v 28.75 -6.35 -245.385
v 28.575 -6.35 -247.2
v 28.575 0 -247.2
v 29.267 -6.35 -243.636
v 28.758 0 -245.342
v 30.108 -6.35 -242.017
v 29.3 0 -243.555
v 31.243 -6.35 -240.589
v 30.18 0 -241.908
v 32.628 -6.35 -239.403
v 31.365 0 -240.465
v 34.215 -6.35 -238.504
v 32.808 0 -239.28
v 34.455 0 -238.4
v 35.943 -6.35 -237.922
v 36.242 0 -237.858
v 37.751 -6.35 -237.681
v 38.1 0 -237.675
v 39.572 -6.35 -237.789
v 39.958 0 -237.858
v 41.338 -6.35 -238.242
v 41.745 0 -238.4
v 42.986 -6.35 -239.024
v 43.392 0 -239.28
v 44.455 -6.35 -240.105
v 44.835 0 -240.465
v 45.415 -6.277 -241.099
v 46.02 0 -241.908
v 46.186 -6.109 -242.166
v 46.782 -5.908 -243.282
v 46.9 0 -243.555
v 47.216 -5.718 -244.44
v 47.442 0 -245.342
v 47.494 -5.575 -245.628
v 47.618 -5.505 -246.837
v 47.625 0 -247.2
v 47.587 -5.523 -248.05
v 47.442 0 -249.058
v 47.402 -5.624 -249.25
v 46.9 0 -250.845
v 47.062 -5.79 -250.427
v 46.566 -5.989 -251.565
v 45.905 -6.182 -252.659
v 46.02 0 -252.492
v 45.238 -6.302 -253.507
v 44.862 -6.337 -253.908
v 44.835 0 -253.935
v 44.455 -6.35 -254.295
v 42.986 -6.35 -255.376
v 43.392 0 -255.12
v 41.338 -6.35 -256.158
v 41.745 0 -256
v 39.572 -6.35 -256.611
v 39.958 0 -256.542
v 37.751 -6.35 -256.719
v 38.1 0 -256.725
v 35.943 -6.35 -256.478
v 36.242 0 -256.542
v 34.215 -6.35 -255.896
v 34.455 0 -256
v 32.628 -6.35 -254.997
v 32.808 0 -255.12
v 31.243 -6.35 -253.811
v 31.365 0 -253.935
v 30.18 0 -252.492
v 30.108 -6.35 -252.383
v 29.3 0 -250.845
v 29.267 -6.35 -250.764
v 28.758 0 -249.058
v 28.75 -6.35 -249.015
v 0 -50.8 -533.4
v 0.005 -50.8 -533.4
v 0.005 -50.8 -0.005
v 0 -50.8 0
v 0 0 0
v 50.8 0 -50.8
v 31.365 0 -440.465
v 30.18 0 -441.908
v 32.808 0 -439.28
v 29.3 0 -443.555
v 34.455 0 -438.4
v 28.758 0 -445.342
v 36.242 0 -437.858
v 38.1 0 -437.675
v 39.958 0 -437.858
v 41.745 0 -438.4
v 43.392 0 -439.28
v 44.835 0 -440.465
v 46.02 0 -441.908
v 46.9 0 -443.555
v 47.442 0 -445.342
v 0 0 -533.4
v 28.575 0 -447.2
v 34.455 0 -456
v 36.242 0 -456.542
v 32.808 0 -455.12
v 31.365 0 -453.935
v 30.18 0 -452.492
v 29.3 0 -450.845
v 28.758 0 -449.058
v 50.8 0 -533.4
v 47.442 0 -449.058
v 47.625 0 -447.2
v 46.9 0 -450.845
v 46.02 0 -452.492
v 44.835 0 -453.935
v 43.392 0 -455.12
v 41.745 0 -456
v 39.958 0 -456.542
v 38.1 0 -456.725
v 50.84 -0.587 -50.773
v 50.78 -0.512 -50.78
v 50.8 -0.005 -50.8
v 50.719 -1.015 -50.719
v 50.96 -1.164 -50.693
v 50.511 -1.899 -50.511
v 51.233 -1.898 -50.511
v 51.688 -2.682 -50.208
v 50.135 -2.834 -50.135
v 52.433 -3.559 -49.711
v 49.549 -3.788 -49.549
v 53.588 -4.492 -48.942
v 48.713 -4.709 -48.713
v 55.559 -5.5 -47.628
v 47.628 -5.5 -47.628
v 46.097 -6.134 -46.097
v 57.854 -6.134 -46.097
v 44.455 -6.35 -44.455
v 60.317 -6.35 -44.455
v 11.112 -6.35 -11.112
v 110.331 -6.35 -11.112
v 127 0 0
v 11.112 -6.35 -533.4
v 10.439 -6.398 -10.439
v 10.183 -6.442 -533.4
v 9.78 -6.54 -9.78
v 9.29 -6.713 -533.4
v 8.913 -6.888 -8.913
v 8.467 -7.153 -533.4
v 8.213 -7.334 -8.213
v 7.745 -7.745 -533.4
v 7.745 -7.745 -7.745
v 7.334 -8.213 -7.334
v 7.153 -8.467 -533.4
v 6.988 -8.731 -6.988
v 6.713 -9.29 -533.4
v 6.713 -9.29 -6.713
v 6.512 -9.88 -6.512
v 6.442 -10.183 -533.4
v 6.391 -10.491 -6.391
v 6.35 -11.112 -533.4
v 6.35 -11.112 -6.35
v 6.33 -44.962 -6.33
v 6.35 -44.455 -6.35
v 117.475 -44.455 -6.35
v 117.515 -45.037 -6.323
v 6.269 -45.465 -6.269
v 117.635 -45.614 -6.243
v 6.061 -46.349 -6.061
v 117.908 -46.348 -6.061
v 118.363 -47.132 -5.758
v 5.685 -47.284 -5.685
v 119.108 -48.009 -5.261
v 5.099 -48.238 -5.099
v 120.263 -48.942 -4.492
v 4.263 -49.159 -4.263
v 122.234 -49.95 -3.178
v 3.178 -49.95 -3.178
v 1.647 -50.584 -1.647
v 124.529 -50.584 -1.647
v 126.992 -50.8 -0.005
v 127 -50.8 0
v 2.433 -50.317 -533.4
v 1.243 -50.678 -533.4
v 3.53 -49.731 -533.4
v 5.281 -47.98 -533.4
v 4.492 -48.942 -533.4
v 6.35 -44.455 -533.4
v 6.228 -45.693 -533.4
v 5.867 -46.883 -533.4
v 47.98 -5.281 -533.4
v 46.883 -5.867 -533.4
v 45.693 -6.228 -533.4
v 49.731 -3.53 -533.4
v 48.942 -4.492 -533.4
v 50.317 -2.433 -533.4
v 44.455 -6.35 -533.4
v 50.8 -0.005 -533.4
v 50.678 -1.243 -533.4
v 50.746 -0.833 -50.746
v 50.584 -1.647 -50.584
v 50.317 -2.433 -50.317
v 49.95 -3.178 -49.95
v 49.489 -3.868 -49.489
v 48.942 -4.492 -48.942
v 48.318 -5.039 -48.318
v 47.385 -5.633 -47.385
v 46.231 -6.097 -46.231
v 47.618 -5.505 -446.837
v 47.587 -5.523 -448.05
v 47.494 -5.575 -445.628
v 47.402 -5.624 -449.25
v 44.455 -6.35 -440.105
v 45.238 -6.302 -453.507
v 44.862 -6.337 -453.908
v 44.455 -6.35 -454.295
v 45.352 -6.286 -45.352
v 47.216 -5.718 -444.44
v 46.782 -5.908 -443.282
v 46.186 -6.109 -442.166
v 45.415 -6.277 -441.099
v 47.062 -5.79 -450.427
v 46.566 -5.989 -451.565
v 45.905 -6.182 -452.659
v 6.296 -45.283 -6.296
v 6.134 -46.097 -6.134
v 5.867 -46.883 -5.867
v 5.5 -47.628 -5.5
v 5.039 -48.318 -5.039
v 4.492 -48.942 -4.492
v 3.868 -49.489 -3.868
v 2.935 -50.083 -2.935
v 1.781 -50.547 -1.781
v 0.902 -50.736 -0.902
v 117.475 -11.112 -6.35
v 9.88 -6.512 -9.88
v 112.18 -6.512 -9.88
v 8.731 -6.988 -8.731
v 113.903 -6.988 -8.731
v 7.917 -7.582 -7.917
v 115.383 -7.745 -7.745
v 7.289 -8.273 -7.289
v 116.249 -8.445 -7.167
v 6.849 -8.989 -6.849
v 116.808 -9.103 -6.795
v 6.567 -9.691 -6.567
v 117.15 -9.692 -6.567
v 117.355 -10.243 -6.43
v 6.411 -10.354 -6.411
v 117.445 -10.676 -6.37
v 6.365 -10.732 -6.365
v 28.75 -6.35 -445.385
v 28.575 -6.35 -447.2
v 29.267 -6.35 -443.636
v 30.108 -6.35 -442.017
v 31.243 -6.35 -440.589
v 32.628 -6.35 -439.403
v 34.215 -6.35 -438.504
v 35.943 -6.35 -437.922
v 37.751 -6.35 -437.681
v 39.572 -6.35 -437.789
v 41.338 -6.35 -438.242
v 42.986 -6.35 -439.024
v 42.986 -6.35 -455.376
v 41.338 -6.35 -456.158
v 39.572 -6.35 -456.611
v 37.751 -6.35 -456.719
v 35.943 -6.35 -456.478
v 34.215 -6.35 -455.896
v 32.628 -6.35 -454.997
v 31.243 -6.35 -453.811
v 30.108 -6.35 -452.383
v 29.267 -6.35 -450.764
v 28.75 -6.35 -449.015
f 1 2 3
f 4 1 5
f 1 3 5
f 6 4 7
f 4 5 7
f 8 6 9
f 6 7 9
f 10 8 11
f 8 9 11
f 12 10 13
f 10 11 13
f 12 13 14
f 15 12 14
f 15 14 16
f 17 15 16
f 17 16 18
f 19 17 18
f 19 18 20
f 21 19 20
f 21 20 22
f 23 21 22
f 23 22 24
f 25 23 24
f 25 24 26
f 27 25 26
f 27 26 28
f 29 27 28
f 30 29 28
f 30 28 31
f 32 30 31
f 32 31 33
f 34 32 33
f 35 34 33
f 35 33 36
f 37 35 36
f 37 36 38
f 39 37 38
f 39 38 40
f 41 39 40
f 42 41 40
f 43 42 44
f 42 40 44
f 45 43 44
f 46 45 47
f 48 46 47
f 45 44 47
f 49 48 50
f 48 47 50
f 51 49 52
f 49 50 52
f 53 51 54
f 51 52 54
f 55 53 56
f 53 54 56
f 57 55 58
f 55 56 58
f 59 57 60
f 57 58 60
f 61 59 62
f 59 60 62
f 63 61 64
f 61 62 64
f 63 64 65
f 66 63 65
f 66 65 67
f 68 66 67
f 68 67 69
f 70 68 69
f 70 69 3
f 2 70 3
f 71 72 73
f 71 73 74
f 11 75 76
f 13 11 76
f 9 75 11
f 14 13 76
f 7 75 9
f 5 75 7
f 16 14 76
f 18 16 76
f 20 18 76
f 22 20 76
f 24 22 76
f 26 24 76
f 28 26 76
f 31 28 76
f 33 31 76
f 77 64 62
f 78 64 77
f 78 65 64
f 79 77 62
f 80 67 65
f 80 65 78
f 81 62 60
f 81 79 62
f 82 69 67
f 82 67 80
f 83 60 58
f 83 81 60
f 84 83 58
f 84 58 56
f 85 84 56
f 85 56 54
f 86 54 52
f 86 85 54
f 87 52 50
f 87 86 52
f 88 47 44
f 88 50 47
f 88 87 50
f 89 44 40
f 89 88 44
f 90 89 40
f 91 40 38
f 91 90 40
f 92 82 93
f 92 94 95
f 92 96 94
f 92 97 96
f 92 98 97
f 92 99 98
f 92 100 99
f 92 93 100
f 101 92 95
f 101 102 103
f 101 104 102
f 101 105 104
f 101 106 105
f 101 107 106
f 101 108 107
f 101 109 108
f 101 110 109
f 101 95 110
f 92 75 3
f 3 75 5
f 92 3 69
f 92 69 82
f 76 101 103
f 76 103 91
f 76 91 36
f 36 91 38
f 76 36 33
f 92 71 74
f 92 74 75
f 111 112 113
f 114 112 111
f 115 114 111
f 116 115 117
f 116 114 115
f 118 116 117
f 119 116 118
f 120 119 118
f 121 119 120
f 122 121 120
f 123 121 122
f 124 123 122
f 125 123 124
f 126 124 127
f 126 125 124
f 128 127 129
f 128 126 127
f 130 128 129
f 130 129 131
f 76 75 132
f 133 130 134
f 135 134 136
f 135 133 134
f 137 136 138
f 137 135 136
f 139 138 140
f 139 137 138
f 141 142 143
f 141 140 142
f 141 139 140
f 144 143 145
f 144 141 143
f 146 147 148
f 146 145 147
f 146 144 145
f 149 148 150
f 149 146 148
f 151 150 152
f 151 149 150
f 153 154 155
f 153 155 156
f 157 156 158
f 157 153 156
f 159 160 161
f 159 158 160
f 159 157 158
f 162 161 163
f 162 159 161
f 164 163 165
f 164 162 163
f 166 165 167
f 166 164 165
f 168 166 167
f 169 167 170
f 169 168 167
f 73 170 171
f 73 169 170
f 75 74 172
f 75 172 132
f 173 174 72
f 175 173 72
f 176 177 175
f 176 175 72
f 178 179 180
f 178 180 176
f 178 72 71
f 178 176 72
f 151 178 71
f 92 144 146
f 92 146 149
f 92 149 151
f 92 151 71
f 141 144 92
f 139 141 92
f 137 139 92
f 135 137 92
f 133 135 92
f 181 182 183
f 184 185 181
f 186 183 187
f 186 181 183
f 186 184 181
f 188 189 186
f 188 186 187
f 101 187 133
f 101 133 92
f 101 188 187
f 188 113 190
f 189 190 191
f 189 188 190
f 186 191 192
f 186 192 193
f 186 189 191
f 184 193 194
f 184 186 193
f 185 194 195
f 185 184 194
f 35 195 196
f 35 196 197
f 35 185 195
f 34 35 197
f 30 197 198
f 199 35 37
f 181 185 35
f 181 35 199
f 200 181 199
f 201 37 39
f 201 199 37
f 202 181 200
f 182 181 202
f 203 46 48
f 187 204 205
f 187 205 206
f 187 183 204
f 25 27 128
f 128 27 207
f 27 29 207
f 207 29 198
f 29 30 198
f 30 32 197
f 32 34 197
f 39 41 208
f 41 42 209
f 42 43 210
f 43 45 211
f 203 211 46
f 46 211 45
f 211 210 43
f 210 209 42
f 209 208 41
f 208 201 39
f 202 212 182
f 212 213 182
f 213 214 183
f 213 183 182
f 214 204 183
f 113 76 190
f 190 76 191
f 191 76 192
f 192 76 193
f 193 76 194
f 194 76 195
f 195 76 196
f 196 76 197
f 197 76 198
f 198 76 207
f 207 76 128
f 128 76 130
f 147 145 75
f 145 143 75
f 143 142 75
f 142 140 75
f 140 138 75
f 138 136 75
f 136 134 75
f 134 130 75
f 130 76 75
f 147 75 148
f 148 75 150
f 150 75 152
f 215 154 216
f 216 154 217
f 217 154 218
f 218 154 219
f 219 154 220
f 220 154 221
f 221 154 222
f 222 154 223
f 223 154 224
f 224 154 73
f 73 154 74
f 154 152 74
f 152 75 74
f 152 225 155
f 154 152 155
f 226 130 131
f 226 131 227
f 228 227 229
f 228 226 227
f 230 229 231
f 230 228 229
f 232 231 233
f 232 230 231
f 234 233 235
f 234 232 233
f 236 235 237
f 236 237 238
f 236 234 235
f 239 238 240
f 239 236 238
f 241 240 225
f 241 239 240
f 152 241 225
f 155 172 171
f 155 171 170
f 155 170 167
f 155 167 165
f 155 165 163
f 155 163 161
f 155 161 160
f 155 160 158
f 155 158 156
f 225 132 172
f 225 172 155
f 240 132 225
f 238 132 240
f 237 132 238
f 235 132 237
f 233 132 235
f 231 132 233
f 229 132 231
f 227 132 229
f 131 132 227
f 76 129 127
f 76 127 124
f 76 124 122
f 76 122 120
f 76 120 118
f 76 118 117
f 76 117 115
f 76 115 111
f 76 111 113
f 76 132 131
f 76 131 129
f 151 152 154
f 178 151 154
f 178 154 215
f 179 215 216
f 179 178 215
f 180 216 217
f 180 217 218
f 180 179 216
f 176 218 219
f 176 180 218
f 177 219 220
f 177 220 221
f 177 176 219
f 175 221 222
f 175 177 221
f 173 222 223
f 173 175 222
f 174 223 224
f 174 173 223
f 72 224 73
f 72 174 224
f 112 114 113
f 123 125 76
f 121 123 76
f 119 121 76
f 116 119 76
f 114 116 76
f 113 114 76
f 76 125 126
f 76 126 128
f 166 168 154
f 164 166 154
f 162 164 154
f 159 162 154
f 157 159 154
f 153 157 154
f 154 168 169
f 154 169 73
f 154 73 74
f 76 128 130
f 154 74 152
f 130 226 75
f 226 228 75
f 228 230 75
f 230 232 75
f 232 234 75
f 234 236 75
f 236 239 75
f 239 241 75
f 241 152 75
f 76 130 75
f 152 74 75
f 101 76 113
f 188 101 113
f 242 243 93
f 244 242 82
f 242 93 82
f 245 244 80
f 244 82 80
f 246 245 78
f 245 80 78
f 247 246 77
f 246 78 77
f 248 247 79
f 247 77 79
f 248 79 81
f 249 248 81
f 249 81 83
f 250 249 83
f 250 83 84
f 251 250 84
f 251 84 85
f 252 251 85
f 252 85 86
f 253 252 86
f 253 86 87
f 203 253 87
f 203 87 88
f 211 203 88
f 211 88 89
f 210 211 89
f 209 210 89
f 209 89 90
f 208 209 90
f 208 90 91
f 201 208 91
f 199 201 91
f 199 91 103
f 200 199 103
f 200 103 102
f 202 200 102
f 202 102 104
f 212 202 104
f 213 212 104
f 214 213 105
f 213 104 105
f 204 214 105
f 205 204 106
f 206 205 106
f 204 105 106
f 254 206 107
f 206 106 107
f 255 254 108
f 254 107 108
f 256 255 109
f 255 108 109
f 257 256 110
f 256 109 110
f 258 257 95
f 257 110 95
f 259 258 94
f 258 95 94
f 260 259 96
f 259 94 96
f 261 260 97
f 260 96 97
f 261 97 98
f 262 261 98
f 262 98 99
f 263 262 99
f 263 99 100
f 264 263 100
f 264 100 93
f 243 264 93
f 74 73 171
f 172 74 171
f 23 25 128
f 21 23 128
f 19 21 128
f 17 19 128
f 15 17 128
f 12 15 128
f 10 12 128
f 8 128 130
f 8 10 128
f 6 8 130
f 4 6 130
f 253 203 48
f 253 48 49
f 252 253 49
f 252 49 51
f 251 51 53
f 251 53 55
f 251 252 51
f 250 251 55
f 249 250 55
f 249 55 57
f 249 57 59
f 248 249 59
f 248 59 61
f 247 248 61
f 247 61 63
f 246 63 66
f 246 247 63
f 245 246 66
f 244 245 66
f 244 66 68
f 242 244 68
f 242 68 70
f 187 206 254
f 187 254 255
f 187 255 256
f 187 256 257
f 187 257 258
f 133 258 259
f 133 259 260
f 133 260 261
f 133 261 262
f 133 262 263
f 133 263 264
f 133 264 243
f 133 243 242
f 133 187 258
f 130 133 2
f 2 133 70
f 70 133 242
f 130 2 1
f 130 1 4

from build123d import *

# Parameters (mm, degrees)
HIERRO_ANGULAR_2_X_2_X_0_125_1_DEPTH        = 606.242048969
HIERRO_ANGULAR_2_X_2_X_0_125_1_2_DEPTH      = 127
HIERRO_ANGULAR_2_X_2_X_0_125_1_2_DEPTH_BACK = 72.842048969
CROQUIS2_R                                  = 9.525
CORTAR_EXTRUIR1_DEPTH                       = 551.658878072
CORTAR_EXTRUIR2_DEPTH                       = 176.53


with BuildPart() as part:
    # Sketch1 on segment 1 (carried to segment 1) → Hierro angular 2 X 2 X 0.125(1) (new body)
    with BuildSketch(Plane(origin=(0, 0, -533.4), x_dir=(0, -1, 0), z_dir=(0, 0, 1))):
        with BuildLine():
            Line((0, 0), (0, 50.8))
            Line((0, 50.8), (0.00508, 50.8))
            ThreePointArc((0.00508, 50.8), (4.491615958, 48.941615958), (6.35, 44.45508))
            Line((6.35, 44.45508), (6.35, 11.1125))
            ThreePointArc((6.35, 11.1125), (7.744903955, 7.744903955), (11.1125, 6.35))
            Line((11.1125, 6.35), (44.45508, 6.35))
            ThreePointArc((44.45508, 6.35), (48.941615958, 4.491615958), (50.8, 0.00508))
            Line((50.8, 0.00508), (50.8, 0))
            Line((50.8, 0), (0, 0))
        make_face()
    extrude(amount=HIERRO_ANGULAR_2_X_2_X_0_125_1_DEPTH)

    # Hierro angular 2 X 2 X 0.125(1) mitre 1
    split(bisect_by=Plane(origin=(0, 0, 0), x_dir=(0, -1, 0), z_dir=(-0.707106781, 0, -0.707106781)), keep=Keep.TOP)

    # Croquis2 → Cortar-Extruir1 (cut, through all)
    with BuildSketch(Plane(origin=(0, 0, 0), x_dir=(1, 0, 0), z_dir=(0, 1, 0))):
        with Locations(Location((38.1, 447.2, 0), (0, 0, 180))):
            Circle(CROQUIS2_R)
        with Locations(Location((38.1, 247.2, 0), (0, 0, 180))):
            Circle(CROQUIS2_R)
    extrude(amount=-CORTAR_EXTRUIR1_DEPTH, mode=Mode.SUBTRACT)


with BuildPart() as body_2:
    # Sketch1 → Hierro angular 2 X 2 X 0.125_1 2 (new, two sides: drawn at the far end of the back side and taken through both)
    with BuildSketch(Plane(origin=(0, 0, 0), x_dir=(0, -1, 0), z_dir=(1, 0, 0)).offset(-HIERRO_ANGULAR_2_X_2_X_0_125_1_2_DEPTH_BACK)):
        with BuildLine():
            Line((0, 0), (0, 50.8))
            Line((0, 50.8), (0.00508, 50.8))
            ThreePointArc((0.00508, 50.8), (4.491615958, 48.941615958), (6.35, 44.45508))
            Line((6.35, 44.45508), (6.35, 11.1125))
            ThreePointArc((6.35, 11.1125), (7.744903955, 7.744903955), (11.1125, 6.35))
            Line((11.1125, 6.35), (44.45508, 6.35))
            ThreePointArc((44.45508, 6.35), (48.941615958, 4.491615958), (50.8, 0.00508))
            Line((50.8, 0.00508), (50.8, 0))
            Line((50.8, 0), (0, 0))
        make_face()
    extrude(amount=HIERRO_ANGULAR_2_X_2_X_0_125_1_2_DEPTH + HIERRO_ANGULAR_2_X_2_X_0_125_1_2_DEPTH_BACK)

    # Hierro angular 2 X 2 X 0.125_1 2 mitre 1
    split(bisect_by=Plane(origin=(0, 0, 0), x_dir=(0, 1, 0), z_dir=(0.707106781, 0, 0.707106781)), keep=Keep.TOP)

    # Croquis3 → Cortar-Extruir2 (cut)
    with BuildSketch(Plane(origin=(0, 0, 0), x_dir=(1, 0, 0), z_dir=(0, 1, 0))):
        Polygon((127, 0), (50.8, 50.8), (127, 50.8), align=None)
    extrude(amount=-CORTAR_EXTRUIR2_DEPTH, mode=Mode.SUBTRACT)


solid = Compound([part.part, body_2.part])
